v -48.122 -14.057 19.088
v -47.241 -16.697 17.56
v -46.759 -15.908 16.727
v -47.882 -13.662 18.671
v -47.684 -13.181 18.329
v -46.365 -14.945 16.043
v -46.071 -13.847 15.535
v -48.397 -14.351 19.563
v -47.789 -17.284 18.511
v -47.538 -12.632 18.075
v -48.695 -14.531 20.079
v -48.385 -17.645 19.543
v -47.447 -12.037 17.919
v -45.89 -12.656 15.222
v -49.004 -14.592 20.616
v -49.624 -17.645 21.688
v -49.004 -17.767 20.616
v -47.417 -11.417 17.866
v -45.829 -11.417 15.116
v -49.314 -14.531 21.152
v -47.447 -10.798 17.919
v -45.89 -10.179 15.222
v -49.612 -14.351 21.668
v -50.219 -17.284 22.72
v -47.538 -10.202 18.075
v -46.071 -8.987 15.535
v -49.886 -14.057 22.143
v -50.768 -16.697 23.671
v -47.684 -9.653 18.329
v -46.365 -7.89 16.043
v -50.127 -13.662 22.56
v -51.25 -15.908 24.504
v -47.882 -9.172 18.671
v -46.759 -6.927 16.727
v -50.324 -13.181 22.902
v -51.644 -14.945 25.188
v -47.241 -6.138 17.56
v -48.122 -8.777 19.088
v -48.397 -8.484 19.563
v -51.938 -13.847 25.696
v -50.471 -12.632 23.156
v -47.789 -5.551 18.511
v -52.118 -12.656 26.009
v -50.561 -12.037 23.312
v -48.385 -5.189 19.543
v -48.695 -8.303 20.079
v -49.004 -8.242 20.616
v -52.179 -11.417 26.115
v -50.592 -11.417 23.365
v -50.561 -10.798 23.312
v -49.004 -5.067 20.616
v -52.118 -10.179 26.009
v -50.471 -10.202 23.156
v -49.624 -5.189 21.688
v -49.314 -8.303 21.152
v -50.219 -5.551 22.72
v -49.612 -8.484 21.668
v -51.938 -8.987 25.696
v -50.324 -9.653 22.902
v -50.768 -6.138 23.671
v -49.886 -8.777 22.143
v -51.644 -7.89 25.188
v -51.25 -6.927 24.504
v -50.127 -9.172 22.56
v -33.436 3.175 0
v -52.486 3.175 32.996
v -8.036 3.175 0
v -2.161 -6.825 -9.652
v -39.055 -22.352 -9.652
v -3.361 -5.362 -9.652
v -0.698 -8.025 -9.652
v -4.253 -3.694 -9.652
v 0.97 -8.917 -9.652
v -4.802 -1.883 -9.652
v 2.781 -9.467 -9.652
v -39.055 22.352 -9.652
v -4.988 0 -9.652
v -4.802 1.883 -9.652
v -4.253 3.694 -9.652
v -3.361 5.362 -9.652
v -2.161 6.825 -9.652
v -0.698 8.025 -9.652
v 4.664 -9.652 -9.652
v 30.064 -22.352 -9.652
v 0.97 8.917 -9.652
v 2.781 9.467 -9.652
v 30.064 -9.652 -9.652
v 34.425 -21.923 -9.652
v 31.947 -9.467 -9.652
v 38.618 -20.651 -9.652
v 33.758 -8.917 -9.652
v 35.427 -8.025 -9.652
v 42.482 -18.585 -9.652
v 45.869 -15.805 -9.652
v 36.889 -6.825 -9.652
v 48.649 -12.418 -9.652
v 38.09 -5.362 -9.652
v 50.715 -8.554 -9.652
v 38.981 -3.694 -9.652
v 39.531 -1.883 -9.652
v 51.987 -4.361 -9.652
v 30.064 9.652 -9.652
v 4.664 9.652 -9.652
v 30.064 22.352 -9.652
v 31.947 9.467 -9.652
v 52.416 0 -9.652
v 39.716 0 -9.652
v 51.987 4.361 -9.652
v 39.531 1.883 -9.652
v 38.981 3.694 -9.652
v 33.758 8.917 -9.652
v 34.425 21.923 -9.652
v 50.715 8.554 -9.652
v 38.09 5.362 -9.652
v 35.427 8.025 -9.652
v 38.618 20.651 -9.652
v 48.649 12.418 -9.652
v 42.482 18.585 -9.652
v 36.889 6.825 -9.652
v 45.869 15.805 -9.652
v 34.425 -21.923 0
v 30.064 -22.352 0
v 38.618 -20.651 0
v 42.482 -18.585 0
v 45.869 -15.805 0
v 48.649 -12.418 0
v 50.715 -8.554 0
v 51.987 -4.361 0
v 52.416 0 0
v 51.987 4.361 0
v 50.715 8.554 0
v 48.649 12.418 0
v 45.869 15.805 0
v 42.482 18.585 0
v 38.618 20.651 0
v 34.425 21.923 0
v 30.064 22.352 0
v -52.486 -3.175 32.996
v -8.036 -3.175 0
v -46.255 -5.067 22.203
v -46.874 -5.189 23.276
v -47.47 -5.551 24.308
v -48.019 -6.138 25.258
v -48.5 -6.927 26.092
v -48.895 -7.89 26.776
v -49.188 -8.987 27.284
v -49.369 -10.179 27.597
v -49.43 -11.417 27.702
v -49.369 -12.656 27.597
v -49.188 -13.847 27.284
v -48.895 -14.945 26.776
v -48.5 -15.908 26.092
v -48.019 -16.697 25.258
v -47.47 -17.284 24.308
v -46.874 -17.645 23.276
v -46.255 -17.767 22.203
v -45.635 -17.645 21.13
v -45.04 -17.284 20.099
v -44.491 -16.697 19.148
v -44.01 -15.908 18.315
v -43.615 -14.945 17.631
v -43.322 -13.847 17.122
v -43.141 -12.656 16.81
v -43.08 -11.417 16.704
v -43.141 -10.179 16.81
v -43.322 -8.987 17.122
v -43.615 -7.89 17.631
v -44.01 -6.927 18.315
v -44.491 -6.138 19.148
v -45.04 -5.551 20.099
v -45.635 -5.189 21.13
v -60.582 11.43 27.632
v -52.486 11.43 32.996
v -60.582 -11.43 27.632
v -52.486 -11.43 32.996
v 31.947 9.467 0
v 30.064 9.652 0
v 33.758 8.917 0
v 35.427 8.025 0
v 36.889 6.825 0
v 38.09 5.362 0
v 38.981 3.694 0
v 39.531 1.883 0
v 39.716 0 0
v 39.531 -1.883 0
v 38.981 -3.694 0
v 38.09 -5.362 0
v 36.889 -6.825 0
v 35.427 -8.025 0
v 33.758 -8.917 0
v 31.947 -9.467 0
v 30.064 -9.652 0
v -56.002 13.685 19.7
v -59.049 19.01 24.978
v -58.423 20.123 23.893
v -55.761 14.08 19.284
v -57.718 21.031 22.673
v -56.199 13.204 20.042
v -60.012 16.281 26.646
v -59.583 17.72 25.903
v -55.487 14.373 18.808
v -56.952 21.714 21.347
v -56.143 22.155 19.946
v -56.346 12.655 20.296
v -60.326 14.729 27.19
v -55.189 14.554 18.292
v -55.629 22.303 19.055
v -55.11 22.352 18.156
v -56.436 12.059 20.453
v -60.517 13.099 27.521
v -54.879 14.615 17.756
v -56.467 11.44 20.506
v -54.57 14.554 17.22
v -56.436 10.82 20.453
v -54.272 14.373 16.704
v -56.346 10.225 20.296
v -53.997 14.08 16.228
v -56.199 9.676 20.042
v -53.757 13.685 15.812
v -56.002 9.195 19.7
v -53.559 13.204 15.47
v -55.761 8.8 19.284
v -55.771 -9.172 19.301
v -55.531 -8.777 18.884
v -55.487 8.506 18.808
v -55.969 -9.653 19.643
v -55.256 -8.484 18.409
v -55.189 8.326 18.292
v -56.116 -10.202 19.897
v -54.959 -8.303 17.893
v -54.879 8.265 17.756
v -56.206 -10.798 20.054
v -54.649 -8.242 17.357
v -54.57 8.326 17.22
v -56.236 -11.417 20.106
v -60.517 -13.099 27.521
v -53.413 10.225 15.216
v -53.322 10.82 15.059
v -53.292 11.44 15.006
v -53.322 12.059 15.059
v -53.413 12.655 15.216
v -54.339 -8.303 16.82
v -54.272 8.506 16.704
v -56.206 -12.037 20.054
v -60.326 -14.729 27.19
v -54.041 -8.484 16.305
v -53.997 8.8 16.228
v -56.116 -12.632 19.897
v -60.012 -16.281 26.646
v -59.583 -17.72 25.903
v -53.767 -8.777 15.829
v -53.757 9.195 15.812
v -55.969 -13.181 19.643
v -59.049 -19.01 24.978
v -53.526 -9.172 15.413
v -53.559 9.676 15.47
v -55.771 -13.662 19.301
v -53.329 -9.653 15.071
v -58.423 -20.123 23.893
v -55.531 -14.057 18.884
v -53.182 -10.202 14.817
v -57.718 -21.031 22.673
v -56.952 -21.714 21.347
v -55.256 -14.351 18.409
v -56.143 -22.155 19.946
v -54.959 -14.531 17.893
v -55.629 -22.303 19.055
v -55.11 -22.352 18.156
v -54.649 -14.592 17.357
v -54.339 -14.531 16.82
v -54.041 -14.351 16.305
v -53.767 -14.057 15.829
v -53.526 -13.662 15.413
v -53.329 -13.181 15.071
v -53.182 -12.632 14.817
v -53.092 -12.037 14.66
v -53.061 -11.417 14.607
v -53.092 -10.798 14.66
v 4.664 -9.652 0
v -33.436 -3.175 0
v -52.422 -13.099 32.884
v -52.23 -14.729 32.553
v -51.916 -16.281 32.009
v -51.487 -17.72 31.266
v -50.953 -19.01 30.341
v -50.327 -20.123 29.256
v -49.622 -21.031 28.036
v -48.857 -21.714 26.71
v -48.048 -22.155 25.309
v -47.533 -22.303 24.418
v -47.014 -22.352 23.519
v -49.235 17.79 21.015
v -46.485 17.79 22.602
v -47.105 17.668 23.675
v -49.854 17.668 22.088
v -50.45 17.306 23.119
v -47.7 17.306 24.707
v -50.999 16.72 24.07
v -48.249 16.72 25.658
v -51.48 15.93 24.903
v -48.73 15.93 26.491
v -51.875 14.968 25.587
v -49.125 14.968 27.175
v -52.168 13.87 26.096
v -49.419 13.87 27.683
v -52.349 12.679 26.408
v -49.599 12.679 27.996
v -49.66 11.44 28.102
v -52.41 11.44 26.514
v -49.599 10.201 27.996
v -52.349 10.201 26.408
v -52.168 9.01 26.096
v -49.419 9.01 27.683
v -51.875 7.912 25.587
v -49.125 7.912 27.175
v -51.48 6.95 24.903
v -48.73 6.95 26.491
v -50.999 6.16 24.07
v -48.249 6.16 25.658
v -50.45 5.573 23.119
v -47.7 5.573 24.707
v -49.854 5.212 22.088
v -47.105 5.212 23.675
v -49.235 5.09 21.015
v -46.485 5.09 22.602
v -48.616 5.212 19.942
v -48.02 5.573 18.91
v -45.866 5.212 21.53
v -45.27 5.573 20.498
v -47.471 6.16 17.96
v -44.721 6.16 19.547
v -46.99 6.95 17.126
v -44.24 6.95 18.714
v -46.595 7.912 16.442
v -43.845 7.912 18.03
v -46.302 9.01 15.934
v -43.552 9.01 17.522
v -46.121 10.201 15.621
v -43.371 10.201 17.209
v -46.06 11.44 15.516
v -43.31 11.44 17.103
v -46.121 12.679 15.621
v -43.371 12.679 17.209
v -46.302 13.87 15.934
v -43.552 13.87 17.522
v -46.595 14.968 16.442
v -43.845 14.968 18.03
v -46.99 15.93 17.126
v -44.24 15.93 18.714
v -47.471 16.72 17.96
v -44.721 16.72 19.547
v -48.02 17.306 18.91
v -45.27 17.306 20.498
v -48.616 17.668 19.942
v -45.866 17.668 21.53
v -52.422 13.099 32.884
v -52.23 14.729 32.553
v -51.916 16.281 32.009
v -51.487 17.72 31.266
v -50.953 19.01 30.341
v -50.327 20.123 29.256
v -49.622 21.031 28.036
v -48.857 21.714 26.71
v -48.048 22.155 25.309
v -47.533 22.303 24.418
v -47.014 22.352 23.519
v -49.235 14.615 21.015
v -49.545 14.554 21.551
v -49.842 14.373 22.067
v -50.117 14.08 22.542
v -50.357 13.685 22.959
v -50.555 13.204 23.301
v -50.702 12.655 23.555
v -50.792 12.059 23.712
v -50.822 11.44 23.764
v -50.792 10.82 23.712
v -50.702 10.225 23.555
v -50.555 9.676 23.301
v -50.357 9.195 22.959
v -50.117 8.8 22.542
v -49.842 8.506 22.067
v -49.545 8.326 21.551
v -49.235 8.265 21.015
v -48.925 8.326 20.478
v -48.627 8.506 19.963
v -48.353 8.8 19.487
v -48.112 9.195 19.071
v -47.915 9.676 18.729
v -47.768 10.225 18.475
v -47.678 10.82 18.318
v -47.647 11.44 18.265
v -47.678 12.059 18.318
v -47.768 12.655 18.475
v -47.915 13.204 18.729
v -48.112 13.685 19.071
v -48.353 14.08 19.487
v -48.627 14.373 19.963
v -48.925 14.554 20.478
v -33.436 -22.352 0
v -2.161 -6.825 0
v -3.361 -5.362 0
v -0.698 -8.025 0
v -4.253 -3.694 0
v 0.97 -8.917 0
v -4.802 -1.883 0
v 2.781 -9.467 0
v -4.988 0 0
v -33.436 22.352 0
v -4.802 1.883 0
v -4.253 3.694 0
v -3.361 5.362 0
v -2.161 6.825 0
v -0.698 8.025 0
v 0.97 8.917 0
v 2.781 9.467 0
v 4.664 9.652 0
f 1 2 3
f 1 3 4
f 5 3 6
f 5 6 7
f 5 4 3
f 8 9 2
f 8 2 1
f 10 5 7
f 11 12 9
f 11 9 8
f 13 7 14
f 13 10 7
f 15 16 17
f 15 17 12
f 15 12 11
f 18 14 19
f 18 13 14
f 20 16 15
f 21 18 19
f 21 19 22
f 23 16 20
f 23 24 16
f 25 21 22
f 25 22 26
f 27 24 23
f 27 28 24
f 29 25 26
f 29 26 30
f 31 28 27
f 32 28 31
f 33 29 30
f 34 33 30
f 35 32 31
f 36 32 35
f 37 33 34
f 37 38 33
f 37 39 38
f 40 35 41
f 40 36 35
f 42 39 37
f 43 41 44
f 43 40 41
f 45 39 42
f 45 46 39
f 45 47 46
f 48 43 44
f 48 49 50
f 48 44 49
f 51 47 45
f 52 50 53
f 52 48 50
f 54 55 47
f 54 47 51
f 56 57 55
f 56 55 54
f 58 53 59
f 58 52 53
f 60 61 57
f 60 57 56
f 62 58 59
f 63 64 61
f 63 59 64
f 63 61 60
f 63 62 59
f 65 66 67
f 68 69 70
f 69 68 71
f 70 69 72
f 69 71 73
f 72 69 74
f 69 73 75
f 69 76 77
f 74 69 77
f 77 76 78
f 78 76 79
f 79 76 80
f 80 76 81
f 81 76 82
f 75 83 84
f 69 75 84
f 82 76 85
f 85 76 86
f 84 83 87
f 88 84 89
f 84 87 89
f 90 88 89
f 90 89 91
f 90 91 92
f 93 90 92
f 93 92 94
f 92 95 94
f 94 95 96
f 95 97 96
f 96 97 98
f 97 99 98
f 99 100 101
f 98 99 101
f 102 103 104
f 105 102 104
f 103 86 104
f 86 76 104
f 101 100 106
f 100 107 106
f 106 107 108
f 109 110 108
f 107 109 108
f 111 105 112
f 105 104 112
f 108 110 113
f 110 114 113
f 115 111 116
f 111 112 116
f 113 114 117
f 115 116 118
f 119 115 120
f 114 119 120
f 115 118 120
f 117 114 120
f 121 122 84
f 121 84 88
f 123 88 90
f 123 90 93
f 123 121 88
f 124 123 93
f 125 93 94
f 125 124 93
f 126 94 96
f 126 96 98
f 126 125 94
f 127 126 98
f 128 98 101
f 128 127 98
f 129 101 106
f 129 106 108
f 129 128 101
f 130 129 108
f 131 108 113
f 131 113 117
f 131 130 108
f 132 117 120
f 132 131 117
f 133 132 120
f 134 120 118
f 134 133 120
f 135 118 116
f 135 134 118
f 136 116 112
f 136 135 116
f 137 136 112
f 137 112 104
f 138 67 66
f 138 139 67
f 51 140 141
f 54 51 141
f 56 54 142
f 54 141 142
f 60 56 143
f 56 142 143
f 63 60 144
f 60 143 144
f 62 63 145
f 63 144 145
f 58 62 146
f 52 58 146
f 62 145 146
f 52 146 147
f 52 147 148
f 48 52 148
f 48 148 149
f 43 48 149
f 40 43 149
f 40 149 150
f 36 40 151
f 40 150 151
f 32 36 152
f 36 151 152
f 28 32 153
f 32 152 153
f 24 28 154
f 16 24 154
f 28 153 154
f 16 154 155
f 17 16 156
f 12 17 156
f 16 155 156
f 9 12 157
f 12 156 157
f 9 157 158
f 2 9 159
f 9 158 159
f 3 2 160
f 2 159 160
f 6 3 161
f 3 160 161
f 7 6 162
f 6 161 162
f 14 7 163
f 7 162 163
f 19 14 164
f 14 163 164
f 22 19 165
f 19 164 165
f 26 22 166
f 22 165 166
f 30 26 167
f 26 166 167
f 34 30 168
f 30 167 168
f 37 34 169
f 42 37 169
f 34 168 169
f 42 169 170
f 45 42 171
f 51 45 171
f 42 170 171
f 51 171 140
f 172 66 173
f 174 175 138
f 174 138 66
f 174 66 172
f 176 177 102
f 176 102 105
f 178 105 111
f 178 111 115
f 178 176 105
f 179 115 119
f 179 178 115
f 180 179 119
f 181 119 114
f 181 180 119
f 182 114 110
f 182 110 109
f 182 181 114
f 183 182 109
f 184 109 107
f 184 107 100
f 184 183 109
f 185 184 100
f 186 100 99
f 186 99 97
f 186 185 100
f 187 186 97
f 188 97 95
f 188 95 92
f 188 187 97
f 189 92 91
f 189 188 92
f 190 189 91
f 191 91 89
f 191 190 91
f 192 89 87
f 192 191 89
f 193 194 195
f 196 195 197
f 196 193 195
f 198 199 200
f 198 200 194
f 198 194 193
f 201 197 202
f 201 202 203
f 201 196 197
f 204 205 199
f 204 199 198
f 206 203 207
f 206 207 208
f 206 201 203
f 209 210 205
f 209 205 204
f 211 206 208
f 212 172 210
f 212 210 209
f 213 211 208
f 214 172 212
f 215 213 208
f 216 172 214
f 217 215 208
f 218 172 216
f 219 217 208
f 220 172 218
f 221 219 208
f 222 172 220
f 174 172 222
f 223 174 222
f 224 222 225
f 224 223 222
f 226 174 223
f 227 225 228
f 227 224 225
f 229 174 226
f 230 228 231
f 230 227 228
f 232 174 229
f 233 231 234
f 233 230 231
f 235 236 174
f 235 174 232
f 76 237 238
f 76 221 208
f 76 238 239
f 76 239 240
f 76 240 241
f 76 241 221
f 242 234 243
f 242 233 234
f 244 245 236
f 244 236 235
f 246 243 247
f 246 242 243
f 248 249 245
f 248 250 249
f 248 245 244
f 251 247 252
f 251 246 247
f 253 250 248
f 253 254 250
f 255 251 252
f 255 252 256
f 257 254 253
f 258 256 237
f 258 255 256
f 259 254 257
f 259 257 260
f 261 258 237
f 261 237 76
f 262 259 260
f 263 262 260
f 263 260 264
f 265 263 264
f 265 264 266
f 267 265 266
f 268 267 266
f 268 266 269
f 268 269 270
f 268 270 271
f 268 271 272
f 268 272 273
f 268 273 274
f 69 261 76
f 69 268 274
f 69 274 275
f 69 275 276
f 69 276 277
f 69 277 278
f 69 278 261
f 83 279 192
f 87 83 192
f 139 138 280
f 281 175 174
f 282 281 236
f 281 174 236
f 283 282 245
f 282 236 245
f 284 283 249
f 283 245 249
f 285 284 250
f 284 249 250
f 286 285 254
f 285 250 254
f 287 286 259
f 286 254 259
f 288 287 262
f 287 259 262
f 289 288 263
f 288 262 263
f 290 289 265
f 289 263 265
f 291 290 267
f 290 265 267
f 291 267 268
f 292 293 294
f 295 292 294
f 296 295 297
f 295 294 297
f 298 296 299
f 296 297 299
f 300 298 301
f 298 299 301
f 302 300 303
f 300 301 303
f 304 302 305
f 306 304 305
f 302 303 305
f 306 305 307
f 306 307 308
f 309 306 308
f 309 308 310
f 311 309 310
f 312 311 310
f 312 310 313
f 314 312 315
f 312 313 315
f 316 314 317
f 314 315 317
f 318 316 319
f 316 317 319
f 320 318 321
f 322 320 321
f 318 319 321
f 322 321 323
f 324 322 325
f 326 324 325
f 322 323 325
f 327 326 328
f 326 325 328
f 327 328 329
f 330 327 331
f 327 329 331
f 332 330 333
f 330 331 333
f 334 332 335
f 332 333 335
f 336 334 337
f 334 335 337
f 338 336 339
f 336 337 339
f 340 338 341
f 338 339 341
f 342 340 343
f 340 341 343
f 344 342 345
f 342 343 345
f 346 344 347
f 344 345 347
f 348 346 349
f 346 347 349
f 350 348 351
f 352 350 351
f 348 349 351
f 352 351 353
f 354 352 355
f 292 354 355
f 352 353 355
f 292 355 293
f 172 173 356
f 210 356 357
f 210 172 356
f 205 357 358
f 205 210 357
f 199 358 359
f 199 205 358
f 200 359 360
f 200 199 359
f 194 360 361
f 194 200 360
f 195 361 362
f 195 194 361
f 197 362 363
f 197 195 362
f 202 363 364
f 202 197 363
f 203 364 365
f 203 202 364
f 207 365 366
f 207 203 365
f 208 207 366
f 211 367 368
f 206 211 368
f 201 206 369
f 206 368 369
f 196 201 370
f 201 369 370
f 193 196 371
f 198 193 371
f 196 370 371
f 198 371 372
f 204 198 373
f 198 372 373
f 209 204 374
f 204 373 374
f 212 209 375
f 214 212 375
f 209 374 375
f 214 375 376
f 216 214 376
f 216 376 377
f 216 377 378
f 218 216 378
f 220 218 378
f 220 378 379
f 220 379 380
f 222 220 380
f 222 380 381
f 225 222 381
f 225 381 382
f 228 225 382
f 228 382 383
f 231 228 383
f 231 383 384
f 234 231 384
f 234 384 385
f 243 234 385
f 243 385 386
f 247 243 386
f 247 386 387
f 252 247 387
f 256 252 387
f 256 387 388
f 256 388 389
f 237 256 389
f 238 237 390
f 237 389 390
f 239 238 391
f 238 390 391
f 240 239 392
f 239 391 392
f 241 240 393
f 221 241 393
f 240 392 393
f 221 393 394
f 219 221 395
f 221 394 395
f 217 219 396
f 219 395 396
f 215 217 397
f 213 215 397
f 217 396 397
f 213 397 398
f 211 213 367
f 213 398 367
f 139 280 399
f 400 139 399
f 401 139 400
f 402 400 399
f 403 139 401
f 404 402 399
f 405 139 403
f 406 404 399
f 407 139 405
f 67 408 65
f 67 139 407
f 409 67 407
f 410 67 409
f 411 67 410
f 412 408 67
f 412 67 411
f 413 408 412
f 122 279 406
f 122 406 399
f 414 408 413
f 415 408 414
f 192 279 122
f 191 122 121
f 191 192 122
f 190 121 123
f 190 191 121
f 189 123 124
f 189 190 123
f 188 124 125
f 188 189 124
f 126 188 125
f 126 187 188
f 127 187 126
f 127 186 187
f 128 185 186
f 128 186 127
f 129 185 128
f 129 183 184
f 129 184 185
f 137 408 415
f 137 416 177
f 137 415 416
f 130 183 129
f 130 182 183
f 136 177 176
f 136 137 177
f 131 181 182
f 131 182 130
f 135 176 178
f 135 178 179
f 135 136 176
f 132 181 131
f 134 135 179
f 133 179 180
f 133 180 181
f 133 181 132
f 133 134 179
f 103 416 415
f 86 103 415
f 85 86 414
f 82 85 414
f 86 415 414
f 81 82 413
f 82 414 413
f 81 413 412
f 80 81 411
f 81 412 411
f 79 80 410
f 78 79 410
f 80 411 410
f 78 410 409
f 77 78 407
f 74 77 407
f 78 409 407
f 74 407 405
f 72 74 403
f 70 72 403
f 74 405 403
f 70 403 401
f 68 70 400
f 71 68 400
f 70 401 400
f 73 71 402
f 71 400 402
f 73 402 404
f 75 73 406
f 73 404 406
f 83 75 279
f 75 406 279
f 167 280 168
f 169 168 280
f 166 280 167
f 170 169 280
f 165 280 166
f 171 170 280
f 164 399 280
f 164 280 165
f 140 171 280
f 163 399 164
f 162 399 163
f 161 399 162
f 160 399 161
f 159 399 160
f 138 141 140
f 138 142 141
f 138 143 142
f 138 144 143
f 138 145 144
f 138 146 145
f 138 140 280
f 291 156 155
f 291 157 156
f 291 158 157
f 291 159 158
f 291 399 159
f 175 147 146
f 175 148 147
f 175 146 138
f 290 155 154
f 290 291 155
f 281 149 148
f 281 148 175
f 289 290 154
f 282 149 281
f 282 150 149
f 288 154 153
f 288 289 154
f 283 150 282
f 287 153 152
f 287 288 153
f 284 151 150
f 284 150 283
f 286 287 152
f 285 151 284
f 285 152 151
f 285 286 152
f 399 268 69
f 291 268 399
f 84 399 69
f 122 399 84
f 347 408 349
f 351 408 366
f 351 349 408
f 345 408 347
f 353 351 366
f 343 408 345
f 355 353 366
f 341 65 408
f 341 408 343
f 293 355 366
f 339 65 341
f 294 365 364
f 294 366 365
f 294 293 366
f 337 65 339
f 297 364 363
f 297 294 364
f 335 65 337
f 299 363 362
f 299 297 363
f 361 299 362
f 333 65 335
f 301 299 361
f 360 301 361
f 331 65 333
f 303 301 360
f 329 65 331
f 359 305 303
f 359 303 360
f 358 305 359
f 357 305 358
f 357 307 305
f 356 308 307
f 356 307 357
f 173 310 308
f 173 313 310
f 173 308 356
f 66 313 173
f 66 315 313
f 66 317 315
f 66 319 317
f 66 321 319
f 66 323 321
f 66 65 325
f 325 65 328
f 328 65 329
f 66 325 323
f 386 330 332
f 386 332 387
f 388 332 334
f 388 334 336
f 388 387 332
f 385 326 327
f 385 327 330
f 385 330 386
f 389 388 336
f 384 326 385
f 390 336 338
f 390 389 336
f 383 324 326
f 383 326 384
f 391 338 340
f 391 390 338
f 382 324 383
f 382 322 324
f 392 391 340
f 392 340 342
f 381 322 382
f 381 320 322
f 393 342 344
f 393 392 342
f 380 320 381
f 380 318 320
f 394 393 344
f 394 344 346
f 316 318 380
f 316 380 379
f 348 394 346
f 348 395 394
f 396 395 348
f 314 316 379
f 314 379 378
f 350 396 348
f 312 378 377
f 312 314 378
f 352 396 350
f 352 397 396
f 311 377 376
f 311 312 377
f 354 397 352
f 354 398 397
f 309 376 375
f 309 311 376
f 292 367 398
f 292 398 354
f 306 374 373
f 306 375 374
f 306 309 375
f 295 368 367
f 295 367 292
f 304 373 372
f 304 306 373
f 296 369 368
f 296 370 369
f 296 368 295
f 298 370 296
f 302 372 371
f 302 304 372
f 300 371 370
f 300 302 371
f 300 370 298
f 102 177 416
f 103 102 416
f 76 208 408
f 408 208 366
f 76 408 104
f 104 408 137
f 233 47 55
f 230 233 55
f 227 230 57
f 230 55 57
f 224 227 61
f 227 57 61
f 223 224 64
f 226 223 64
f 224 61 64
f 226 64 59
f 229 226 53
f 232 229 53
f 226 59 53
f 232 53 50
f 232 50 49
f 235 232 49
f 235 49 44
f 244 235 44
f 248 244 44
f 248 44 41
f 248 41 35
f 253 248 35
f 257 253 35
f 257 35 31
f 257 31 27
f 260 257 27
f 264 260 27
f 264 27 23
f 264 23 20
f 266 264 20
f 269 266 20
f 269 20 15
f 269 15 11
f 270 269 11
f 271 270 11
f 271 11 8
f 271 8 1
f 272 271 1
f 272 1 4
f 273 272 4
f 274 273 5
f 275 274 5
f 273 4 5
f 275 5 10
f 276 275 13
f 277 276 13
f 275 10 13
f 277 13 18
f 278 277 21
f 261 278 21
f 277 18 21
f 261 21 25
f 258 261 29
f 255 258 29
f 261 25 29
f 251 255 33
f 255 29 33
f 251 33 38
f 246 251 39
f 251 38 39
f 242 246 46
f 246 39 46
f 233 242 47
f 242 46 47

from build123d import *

# Parameters (mm, degrees)
F1_DEPTH  = 22.352
F2_DEPTH  = 3.175
F3_R      = 10.922
F5_DEPTH  = 9.652
F6_DEPTH  = 9.652
F8_R      = 3.175
F9_DEPTH  = 22.352
F8_R_2    = 6.35
F10_DEPTH = 3.175


with BuildPart() as f1:
    # F0 (on Front) → F1 (new body, symmetric)
    with BuildSketch(Plane.XZ):
        Polygon((-8.0358399709, 0), (-33.4358399709, 0), (-52.4858399709, 32.9955678842), (-60.5815056276, 27.632467684), (-39.0553081737, -9.652), (30.0641600291, -9.652), (30.0641600291, 0), align=None)
    extrude(amount=F1_DEPTH, both=True)

    # F0 (on Front) → F2 (join, symmetric)
    with BuildSketch(Plane.XZ):
        Polygon((-52.4858399709, 32.9955678842), (-33.4358399709, 0), (-8.0358399709, 0), align=None)
    extrude(amount=F2_DEPTH, both=True)

    # F3
    f3_edges = [f1.edges().sort_by_distance(p)[0] for p in [
        (-56.533673, -22.352, 30.314018),
        (-56.533673, 22.352, 30.314018),
    ]]
    fillet(f3_edges, radius=F3_R)

    # F4 (on face) → F5 (join)
    with BuildSketch(Plane.XY):
        with BuildLine():
            Line((30.0641600291, -9.652), (30.0641600291, -22.352))
            ThreePointArc((30.0641600291, -22.352), (52.4161600291, 0), (30.0641600291, 22.352))
            Line((30.0641600291, 22.352), (30.0641600291, 9.652))
            ThreePointArc((30.0641600291, 9.652), (39.7161600291, 0), (30.0641600291, -9.652))
        make_face()
    extrude(amount=-F5_DEPTH)

    # F4 (on face) → F6 (cut)
    with BuildSketch(Plane.XY):
        with BuildLine():
            Line((4.6641600291, -9.652), (30.0641600291, -9.652))
            Line((30.0641600291, -9.652), (30.0641600291, 0))
            Line((30.0641600291, 0), (30.0641600291, 9.652))
            Line((30.0641600291, 9.652), (4.6641600291, 9.652))
            ThreePointArc((4.6641600291, 9.652), (-4.9878399709, 0), (4.6641600291, -9.652))
        make_face()
    extrude(amount=-F6_DEPTH, mode=Mode.SUBTRACT)

    # F8 (on face) → F9 (cut)
    with BuildSketch(Plane(origin=(-25.0768799782, 0, -14.4781434058), x_dir=(0, 1, 0), z_dir=(0.8660254038, 0, 0.5))):
        with Locations((-11.417399453, 42.3558945687)):
            Circle(F8_R)
        with Locations((11.4397590045, 42.816884833)):
            Circle(F8_R)
    extrude(amount=-F9_DEPTH, mode=Mode.SUBTRACT)

    # F8 (on face) → F10 (cut)
    with BuildSketch(Plane(origin=(-25.0768799782, 0, -14.4781434058), x_dir=(0, 1, 0), z_dir=(0.8660254038, 0, 0.5))):
        with Locations((-11.417399453, 42.3558945687)):
            Circle(F8_R_2)
        with Locations((-11.417399453, 42.3558945687)):
            Circle(F8_R, mode=Mode.SUBTRACT)
        with Locations((11.4397590045, 42.816884833)):
            Circle(F8_R_2)
        with Locations((11.4397590045, 42.816884833)):
            Circle(F8_R, mode=Mode.SUBTRACT)
    extrude(amount=-F10_DEPTH, mode=Mode.SUBTRACT)


solid = f1.part
